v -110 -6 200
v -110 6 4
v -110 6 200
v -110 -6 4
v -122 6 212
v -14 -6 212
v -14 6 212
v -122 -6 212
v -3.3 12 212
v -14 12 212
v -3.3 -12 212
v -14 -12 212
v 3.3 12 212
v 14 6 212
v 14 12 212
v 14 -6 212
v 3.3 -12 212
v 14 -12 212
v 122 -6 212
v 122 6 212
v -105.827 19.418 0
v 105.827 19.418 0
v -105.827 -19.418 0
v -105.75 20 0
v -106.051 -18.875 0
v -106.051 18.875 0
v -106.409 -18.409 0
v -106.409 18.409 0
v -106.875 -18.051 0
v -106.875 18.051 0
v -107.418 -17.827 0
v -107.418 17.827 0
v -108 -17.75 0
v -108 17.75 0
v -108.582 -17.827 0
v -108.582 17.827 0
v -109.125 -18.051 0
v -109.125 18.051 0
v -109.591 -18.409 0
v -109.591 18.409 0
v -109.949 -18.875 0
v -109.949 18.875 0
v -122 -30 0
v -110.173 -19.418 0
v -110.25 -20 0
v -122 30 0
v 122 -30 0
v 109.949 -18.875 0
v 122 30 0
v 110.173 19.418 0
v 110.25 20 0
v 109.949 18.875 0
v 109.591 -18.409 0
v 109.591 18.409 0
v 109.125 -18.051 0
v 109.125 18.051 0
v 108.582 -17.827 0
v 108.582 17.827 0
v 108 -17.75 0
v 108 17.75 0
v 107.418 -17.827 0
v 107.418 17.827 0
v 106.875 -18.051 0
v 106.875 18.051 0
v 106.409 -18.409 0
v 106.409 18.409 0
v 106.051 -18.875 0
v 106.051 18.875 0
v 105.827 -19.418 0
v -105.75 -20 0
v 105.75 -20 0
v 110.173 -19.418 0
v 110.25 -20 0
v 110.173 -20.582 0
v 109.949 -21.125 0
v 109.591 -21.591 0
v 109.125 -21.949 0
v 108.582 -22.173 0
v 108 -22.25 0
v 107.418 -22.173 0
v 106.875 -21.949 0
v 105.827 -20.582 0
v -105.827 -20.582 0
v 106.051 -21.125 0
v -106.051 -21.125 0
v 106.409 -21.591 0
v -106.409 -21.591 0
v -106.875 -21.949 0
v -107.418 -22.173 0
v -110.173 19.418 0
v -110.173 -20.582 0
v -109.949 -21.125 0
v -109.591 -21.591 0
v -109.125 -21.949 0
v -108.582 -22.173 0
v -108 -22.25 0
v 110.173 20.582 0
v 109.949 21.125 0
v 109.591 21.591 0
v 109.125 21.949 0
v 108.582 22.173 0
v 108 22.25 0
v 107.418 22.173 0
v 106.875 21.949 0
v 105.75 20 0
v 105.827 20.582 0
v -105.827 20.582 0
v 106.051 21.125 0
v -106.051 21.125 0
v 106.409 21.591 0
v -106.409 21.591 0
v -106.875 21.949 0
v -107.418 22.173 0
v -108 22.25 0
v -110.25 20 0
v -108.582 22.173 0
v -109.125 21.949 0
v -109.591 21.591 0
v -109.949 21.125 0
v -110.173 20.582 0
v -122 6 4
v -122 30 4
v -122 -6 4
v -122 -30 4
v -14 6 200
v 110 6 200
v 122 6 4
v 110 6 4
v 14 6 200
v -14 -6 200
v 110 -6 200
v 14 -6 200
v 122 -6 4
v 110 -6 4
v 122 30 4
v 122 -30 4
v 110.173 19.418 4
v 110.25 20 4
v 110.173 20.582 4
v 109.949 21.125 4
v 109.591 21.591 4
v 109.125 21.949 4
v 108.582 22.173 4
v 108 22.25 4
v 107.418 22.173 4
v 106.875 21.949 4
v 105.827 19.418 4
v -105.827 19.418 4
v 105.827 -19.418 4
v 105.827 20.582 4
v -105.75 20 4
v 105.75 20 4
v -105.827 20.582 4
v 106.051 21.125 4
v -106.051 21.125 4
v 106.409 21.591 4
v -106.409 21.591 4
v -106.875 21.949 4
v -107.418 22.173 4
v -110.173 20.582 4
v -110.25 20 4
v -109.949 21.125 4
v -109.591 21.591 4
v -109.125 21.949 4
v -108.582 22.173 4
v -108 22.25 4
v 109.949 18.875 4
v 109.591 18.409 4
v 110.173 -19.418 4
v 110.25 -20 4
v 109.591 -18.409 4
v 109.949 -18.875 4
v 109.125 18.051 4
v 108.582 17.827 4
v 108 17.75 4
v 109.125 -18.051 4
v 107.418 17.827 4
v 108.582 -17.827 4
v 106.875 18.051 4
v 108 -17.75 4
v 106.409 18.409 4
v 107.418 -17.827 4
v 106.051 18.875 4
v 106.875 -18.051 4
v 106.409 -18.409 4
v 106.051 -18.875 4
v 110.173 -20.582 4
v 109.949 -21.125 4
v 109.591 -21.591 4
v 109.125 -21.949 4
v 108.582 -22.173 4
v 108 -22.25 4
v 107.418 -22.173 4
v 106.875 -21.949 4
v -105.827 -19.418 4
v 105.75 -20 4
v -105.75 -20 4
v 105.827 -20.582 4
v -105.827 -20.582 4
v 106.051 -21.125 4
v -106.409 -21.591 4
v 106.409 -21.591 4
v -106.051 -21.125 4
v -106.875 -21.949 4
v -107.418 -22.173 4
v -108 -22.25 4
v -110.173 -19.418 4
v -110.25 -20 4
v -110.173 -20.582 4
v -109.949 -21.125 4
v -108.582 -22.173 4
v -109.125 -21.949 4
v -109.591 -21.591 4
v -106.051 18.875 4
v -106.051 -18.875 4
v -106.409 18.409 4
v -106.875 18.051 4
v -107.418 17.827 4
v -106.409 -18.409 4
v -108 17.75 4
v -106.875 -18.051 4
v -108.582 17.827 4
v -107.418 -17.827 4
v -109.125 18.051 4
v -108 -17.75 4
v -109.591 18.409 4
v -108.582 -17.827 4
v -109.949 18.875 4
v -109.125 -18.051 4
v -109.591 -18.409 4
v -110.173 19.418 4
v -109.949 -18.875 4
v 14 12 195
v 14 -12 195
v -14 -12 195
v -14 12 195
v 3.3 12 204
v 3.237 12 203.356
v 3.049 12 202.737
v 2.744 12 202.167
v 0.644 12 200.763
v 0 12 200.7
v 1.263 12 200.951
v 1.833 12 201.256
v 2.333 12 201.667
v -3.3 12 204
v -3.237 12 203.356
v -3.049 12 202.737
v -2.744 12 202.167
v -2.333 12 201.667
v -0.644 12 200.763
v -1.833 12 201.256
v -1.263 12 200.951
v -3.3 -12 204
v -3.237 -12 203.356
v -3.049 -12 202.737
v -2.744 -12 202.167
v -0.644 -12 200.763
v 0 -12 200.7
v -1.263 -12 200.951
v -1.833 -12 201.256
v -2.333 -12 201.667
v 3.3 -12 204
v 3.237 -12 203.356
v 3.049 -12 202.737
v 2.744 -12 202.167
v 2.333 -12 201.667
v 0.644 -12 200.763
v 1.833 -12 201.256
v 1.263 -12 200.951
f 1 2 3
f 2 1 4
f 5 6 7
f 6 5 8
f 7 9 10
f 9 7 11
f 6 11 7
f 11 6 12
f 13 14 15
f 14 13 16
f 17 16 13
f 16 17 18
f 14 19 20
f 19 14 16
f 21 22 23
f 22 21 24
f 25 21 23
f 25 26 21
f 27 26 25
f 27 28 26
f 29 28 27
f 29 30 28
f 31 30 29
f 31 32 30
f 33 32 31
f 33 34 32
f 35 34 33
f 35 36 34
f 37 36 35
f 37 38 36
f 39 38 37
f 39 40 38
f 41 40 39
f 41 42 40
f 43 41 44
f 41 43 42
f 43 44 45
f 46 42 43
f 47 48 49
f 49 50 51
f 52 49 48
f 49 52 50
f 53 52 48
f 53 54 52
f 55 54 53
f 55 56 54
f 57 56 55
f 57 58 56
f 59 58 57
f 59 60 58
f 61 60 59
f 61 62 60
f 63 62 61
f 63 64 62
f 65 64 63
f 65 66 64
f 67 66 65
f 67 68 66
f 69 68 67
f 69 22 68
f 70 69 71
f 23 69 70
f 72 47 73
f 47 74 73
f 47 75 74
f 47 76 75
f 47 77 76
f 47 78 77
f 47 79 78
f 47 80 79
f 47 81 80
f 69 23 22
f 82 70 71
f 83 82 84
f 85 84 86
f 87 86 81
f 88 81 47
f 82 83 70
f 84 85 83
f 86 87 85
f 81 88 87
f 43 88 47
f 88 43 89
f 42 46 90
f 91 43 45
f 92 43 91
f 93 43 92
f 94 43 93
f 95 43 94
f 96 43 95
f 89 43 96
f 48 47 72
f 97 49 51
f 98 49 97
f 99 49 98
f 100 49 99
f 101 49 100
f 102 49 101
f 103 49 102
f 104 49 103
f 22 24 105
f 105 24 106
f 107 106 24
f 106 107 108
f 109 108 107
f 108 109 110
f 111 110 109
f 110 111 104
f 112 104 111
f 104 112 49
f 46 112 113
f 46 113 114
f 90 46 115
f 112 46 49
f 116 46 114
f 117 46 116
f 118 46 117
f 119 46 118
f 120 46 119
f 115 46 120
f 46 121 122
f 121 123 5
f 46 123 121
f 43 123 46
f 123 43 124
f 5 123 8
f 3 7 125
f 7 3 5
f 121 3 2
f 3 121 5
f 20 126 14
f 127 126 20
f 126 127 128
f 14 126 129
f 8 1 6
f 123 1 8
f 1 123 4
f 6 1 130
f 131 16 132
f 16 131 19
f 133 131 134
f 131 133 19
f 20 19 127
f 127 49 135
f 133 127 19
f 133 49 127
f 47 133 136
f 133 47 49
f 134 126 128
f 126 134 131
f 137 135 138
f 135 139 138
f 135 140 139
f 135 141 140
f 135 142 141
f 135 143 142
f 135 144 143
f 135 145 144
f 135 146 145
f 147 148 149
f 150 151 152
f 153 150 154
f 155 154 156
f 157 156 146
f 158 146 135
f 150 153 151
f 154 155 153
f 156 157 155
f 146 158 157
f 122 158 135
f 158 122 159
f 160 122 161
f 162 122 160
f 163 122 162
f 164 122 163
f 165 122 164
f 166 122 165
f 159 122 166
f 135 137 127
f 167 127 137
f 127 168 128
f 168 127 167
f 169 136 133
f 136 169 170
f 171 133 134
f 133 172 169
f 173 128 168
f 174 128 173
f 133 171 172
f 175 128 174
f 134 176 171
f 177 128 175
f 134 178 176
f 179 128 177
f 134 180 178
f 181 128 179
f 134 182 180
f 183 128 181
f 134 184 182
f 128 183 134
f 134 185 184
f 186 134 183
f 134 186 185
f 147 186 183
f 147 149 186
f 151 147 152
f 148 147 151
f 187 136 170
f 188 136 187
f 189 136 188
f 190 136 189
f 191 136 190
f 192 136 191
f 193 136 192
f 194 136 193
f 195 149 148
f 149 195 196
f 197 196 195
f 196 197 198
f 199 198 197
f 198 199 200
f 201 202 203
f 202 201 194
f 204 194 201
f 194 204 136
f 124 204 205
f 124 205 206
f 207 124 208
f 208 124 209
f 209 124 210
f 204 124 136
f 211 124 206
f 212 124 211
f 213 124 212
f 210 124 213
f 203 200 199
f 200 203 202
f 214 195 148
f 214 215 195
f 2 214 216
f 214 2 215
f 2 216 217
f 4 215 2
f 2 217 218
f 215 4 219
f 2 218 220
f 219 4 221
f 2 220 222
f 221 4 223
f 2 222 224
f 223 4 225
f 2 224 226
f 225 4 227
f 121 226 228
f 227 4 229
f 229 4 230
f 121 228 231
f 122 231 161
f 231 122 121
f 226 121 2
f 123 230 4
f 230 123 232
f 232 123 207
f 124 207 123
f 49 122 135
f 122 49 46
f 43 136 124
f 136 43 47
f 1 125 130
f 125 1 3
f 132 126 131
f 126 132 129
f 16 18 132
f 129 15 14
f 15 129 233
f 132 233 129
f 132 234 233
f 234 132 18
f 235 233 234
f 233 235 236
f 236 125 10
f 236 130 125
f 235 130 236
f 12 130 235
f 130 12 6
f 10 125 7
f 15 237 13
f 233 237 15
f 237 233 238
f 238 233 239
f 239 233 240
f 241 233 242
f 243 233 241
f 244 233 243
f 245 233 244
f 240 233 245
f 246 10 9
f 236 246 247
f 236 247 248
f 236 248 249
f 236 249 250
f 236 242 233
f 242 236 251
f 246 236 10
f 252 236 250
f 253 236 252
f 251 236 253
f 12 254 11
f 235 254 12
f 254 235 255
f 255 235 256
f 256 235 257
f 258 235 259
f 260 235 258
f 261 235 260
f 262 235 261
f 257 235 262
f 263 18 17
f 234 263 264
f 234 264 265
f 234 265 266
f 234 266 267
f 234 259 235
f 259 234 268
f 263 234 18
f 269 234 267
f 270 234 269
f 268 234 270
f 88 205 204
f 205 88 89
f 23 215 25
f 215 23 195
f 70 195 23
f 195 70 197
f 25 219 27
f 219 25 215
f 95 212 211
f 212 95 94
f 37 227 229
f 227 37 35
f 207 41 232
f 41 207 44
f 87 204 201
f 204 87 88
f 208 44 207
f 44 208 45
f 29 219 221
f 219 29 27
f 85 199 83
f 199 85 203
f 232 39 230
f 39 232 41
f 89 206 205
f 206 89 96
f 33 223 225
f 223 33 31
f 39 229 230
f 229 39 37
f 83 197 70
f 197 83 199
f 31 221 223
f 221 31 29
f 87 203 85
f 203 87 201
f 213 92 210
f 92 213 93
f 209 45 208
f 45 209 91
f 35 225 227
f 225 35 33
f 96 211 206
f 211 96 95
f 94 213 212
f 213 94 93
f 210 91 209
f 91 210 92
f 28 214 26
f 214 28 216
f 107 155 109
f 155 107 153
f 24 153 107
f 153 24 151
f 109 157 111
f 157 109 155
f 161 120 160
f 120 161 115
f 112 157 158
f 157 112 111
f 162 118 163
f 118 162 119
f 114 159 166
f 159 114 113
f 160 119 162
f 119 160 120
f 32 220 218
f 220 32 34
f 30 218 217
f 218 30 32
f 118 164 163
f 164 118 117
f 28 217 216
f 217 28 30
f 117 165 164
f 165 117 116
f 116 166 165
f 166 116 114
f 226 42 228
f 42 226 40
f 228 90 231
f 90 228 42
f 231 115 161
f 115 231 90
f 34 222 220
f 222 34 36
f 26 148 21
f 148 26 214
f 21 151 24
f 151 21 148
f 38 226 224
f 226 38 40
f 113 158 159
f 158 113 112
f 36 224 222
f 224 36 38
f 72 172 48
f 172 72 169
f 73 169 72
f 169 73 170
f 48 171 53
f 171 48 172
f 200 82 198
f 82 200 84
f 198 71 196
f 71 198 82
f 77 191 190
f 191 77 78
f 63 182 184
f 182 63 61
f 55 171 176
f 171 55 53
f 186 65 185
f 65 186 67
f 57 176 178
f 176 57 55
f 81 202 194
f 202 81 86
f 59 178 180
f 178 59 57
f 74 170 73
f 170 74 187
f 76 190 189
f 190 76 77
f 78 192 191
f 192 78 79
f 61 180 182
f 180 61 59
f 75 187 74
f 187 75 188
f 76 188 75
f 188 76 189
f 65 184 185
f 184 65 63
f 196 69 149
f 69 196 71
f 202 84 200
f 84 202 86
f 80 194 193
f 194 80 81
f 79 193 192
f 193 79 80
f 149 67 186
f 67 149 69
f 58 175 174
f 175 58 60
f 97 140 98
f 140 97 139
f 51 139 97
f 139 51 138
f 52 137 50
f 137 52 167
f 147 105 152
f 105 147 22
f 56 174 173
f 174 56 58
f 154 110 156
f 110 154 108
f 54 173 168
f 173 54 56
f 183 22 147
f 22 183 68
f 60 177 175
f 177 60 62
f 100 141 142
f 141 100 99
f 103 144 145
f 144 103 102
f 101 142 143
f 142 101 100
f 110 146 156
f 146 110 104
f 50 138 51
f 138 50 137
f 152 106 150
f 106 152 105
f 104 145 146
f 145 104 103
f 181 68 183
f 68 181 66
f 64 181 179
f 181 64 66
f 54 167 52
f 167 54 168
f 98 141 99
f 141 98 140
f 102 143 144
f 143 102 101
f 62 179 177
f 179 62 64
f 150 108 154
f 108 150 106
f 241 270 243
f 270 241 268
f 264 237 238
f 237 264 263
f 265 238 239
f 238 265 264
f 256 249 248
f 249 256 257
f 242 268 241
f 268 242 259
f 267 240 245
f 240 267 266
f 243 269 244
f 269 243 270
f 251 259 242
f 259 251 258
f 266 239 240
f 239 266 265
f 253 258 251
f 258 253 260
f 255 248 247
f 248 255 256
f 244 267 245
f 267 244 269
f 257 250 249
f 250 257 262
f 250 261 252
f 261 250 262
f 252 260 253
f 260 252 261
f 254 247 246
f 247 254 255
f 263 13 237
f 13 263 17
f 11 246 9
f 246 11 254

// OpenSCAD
clear_width=220; clear_height=200; frame_bar=12; base_depth=60; mount_hole_diameter=4.5; axle_bore=6.6;
module pendulum_gantry(){ difference(){ union(){ translate([-(clear_width+2*frame_bar)/2,-base_depth/2,0]) cube([clear_width+2*frame_bar,base_depth,4]); for(x=[-clear_width/2-frame_bar,clear_width/2]) translate([x,-frame_bar/2,0]) cube([frame_bar,frame_bar,clear_height+frame_bar]); translate([-clear_width/2-frame_bar,-frame_bar/2,clear_height]) cube([clear_width+2*frame_bar,frame_bar,frame_bar]); translate([-14,-12,clear_height-5]) cube([28,24,17]); } translate([0,0,clear_height+4]) rotate([90,0,0]) cylinder(d=axle_bore,h=30,center=true,$fn=32); translate([-axle_bore/2,-16,clear_height+4]) cube([axle_bore,32,16]); for(x=[-108,108],y=[-20,20]) translate([x,y,-1]) cylinder(d=mount_hole_diameter,h=7,$fn=24); }}
assert(clear_width==220 && clear_height==200); echo("SCADCTL_REQUIREMENT:parameters:PASS"); pendulum_gantry();
